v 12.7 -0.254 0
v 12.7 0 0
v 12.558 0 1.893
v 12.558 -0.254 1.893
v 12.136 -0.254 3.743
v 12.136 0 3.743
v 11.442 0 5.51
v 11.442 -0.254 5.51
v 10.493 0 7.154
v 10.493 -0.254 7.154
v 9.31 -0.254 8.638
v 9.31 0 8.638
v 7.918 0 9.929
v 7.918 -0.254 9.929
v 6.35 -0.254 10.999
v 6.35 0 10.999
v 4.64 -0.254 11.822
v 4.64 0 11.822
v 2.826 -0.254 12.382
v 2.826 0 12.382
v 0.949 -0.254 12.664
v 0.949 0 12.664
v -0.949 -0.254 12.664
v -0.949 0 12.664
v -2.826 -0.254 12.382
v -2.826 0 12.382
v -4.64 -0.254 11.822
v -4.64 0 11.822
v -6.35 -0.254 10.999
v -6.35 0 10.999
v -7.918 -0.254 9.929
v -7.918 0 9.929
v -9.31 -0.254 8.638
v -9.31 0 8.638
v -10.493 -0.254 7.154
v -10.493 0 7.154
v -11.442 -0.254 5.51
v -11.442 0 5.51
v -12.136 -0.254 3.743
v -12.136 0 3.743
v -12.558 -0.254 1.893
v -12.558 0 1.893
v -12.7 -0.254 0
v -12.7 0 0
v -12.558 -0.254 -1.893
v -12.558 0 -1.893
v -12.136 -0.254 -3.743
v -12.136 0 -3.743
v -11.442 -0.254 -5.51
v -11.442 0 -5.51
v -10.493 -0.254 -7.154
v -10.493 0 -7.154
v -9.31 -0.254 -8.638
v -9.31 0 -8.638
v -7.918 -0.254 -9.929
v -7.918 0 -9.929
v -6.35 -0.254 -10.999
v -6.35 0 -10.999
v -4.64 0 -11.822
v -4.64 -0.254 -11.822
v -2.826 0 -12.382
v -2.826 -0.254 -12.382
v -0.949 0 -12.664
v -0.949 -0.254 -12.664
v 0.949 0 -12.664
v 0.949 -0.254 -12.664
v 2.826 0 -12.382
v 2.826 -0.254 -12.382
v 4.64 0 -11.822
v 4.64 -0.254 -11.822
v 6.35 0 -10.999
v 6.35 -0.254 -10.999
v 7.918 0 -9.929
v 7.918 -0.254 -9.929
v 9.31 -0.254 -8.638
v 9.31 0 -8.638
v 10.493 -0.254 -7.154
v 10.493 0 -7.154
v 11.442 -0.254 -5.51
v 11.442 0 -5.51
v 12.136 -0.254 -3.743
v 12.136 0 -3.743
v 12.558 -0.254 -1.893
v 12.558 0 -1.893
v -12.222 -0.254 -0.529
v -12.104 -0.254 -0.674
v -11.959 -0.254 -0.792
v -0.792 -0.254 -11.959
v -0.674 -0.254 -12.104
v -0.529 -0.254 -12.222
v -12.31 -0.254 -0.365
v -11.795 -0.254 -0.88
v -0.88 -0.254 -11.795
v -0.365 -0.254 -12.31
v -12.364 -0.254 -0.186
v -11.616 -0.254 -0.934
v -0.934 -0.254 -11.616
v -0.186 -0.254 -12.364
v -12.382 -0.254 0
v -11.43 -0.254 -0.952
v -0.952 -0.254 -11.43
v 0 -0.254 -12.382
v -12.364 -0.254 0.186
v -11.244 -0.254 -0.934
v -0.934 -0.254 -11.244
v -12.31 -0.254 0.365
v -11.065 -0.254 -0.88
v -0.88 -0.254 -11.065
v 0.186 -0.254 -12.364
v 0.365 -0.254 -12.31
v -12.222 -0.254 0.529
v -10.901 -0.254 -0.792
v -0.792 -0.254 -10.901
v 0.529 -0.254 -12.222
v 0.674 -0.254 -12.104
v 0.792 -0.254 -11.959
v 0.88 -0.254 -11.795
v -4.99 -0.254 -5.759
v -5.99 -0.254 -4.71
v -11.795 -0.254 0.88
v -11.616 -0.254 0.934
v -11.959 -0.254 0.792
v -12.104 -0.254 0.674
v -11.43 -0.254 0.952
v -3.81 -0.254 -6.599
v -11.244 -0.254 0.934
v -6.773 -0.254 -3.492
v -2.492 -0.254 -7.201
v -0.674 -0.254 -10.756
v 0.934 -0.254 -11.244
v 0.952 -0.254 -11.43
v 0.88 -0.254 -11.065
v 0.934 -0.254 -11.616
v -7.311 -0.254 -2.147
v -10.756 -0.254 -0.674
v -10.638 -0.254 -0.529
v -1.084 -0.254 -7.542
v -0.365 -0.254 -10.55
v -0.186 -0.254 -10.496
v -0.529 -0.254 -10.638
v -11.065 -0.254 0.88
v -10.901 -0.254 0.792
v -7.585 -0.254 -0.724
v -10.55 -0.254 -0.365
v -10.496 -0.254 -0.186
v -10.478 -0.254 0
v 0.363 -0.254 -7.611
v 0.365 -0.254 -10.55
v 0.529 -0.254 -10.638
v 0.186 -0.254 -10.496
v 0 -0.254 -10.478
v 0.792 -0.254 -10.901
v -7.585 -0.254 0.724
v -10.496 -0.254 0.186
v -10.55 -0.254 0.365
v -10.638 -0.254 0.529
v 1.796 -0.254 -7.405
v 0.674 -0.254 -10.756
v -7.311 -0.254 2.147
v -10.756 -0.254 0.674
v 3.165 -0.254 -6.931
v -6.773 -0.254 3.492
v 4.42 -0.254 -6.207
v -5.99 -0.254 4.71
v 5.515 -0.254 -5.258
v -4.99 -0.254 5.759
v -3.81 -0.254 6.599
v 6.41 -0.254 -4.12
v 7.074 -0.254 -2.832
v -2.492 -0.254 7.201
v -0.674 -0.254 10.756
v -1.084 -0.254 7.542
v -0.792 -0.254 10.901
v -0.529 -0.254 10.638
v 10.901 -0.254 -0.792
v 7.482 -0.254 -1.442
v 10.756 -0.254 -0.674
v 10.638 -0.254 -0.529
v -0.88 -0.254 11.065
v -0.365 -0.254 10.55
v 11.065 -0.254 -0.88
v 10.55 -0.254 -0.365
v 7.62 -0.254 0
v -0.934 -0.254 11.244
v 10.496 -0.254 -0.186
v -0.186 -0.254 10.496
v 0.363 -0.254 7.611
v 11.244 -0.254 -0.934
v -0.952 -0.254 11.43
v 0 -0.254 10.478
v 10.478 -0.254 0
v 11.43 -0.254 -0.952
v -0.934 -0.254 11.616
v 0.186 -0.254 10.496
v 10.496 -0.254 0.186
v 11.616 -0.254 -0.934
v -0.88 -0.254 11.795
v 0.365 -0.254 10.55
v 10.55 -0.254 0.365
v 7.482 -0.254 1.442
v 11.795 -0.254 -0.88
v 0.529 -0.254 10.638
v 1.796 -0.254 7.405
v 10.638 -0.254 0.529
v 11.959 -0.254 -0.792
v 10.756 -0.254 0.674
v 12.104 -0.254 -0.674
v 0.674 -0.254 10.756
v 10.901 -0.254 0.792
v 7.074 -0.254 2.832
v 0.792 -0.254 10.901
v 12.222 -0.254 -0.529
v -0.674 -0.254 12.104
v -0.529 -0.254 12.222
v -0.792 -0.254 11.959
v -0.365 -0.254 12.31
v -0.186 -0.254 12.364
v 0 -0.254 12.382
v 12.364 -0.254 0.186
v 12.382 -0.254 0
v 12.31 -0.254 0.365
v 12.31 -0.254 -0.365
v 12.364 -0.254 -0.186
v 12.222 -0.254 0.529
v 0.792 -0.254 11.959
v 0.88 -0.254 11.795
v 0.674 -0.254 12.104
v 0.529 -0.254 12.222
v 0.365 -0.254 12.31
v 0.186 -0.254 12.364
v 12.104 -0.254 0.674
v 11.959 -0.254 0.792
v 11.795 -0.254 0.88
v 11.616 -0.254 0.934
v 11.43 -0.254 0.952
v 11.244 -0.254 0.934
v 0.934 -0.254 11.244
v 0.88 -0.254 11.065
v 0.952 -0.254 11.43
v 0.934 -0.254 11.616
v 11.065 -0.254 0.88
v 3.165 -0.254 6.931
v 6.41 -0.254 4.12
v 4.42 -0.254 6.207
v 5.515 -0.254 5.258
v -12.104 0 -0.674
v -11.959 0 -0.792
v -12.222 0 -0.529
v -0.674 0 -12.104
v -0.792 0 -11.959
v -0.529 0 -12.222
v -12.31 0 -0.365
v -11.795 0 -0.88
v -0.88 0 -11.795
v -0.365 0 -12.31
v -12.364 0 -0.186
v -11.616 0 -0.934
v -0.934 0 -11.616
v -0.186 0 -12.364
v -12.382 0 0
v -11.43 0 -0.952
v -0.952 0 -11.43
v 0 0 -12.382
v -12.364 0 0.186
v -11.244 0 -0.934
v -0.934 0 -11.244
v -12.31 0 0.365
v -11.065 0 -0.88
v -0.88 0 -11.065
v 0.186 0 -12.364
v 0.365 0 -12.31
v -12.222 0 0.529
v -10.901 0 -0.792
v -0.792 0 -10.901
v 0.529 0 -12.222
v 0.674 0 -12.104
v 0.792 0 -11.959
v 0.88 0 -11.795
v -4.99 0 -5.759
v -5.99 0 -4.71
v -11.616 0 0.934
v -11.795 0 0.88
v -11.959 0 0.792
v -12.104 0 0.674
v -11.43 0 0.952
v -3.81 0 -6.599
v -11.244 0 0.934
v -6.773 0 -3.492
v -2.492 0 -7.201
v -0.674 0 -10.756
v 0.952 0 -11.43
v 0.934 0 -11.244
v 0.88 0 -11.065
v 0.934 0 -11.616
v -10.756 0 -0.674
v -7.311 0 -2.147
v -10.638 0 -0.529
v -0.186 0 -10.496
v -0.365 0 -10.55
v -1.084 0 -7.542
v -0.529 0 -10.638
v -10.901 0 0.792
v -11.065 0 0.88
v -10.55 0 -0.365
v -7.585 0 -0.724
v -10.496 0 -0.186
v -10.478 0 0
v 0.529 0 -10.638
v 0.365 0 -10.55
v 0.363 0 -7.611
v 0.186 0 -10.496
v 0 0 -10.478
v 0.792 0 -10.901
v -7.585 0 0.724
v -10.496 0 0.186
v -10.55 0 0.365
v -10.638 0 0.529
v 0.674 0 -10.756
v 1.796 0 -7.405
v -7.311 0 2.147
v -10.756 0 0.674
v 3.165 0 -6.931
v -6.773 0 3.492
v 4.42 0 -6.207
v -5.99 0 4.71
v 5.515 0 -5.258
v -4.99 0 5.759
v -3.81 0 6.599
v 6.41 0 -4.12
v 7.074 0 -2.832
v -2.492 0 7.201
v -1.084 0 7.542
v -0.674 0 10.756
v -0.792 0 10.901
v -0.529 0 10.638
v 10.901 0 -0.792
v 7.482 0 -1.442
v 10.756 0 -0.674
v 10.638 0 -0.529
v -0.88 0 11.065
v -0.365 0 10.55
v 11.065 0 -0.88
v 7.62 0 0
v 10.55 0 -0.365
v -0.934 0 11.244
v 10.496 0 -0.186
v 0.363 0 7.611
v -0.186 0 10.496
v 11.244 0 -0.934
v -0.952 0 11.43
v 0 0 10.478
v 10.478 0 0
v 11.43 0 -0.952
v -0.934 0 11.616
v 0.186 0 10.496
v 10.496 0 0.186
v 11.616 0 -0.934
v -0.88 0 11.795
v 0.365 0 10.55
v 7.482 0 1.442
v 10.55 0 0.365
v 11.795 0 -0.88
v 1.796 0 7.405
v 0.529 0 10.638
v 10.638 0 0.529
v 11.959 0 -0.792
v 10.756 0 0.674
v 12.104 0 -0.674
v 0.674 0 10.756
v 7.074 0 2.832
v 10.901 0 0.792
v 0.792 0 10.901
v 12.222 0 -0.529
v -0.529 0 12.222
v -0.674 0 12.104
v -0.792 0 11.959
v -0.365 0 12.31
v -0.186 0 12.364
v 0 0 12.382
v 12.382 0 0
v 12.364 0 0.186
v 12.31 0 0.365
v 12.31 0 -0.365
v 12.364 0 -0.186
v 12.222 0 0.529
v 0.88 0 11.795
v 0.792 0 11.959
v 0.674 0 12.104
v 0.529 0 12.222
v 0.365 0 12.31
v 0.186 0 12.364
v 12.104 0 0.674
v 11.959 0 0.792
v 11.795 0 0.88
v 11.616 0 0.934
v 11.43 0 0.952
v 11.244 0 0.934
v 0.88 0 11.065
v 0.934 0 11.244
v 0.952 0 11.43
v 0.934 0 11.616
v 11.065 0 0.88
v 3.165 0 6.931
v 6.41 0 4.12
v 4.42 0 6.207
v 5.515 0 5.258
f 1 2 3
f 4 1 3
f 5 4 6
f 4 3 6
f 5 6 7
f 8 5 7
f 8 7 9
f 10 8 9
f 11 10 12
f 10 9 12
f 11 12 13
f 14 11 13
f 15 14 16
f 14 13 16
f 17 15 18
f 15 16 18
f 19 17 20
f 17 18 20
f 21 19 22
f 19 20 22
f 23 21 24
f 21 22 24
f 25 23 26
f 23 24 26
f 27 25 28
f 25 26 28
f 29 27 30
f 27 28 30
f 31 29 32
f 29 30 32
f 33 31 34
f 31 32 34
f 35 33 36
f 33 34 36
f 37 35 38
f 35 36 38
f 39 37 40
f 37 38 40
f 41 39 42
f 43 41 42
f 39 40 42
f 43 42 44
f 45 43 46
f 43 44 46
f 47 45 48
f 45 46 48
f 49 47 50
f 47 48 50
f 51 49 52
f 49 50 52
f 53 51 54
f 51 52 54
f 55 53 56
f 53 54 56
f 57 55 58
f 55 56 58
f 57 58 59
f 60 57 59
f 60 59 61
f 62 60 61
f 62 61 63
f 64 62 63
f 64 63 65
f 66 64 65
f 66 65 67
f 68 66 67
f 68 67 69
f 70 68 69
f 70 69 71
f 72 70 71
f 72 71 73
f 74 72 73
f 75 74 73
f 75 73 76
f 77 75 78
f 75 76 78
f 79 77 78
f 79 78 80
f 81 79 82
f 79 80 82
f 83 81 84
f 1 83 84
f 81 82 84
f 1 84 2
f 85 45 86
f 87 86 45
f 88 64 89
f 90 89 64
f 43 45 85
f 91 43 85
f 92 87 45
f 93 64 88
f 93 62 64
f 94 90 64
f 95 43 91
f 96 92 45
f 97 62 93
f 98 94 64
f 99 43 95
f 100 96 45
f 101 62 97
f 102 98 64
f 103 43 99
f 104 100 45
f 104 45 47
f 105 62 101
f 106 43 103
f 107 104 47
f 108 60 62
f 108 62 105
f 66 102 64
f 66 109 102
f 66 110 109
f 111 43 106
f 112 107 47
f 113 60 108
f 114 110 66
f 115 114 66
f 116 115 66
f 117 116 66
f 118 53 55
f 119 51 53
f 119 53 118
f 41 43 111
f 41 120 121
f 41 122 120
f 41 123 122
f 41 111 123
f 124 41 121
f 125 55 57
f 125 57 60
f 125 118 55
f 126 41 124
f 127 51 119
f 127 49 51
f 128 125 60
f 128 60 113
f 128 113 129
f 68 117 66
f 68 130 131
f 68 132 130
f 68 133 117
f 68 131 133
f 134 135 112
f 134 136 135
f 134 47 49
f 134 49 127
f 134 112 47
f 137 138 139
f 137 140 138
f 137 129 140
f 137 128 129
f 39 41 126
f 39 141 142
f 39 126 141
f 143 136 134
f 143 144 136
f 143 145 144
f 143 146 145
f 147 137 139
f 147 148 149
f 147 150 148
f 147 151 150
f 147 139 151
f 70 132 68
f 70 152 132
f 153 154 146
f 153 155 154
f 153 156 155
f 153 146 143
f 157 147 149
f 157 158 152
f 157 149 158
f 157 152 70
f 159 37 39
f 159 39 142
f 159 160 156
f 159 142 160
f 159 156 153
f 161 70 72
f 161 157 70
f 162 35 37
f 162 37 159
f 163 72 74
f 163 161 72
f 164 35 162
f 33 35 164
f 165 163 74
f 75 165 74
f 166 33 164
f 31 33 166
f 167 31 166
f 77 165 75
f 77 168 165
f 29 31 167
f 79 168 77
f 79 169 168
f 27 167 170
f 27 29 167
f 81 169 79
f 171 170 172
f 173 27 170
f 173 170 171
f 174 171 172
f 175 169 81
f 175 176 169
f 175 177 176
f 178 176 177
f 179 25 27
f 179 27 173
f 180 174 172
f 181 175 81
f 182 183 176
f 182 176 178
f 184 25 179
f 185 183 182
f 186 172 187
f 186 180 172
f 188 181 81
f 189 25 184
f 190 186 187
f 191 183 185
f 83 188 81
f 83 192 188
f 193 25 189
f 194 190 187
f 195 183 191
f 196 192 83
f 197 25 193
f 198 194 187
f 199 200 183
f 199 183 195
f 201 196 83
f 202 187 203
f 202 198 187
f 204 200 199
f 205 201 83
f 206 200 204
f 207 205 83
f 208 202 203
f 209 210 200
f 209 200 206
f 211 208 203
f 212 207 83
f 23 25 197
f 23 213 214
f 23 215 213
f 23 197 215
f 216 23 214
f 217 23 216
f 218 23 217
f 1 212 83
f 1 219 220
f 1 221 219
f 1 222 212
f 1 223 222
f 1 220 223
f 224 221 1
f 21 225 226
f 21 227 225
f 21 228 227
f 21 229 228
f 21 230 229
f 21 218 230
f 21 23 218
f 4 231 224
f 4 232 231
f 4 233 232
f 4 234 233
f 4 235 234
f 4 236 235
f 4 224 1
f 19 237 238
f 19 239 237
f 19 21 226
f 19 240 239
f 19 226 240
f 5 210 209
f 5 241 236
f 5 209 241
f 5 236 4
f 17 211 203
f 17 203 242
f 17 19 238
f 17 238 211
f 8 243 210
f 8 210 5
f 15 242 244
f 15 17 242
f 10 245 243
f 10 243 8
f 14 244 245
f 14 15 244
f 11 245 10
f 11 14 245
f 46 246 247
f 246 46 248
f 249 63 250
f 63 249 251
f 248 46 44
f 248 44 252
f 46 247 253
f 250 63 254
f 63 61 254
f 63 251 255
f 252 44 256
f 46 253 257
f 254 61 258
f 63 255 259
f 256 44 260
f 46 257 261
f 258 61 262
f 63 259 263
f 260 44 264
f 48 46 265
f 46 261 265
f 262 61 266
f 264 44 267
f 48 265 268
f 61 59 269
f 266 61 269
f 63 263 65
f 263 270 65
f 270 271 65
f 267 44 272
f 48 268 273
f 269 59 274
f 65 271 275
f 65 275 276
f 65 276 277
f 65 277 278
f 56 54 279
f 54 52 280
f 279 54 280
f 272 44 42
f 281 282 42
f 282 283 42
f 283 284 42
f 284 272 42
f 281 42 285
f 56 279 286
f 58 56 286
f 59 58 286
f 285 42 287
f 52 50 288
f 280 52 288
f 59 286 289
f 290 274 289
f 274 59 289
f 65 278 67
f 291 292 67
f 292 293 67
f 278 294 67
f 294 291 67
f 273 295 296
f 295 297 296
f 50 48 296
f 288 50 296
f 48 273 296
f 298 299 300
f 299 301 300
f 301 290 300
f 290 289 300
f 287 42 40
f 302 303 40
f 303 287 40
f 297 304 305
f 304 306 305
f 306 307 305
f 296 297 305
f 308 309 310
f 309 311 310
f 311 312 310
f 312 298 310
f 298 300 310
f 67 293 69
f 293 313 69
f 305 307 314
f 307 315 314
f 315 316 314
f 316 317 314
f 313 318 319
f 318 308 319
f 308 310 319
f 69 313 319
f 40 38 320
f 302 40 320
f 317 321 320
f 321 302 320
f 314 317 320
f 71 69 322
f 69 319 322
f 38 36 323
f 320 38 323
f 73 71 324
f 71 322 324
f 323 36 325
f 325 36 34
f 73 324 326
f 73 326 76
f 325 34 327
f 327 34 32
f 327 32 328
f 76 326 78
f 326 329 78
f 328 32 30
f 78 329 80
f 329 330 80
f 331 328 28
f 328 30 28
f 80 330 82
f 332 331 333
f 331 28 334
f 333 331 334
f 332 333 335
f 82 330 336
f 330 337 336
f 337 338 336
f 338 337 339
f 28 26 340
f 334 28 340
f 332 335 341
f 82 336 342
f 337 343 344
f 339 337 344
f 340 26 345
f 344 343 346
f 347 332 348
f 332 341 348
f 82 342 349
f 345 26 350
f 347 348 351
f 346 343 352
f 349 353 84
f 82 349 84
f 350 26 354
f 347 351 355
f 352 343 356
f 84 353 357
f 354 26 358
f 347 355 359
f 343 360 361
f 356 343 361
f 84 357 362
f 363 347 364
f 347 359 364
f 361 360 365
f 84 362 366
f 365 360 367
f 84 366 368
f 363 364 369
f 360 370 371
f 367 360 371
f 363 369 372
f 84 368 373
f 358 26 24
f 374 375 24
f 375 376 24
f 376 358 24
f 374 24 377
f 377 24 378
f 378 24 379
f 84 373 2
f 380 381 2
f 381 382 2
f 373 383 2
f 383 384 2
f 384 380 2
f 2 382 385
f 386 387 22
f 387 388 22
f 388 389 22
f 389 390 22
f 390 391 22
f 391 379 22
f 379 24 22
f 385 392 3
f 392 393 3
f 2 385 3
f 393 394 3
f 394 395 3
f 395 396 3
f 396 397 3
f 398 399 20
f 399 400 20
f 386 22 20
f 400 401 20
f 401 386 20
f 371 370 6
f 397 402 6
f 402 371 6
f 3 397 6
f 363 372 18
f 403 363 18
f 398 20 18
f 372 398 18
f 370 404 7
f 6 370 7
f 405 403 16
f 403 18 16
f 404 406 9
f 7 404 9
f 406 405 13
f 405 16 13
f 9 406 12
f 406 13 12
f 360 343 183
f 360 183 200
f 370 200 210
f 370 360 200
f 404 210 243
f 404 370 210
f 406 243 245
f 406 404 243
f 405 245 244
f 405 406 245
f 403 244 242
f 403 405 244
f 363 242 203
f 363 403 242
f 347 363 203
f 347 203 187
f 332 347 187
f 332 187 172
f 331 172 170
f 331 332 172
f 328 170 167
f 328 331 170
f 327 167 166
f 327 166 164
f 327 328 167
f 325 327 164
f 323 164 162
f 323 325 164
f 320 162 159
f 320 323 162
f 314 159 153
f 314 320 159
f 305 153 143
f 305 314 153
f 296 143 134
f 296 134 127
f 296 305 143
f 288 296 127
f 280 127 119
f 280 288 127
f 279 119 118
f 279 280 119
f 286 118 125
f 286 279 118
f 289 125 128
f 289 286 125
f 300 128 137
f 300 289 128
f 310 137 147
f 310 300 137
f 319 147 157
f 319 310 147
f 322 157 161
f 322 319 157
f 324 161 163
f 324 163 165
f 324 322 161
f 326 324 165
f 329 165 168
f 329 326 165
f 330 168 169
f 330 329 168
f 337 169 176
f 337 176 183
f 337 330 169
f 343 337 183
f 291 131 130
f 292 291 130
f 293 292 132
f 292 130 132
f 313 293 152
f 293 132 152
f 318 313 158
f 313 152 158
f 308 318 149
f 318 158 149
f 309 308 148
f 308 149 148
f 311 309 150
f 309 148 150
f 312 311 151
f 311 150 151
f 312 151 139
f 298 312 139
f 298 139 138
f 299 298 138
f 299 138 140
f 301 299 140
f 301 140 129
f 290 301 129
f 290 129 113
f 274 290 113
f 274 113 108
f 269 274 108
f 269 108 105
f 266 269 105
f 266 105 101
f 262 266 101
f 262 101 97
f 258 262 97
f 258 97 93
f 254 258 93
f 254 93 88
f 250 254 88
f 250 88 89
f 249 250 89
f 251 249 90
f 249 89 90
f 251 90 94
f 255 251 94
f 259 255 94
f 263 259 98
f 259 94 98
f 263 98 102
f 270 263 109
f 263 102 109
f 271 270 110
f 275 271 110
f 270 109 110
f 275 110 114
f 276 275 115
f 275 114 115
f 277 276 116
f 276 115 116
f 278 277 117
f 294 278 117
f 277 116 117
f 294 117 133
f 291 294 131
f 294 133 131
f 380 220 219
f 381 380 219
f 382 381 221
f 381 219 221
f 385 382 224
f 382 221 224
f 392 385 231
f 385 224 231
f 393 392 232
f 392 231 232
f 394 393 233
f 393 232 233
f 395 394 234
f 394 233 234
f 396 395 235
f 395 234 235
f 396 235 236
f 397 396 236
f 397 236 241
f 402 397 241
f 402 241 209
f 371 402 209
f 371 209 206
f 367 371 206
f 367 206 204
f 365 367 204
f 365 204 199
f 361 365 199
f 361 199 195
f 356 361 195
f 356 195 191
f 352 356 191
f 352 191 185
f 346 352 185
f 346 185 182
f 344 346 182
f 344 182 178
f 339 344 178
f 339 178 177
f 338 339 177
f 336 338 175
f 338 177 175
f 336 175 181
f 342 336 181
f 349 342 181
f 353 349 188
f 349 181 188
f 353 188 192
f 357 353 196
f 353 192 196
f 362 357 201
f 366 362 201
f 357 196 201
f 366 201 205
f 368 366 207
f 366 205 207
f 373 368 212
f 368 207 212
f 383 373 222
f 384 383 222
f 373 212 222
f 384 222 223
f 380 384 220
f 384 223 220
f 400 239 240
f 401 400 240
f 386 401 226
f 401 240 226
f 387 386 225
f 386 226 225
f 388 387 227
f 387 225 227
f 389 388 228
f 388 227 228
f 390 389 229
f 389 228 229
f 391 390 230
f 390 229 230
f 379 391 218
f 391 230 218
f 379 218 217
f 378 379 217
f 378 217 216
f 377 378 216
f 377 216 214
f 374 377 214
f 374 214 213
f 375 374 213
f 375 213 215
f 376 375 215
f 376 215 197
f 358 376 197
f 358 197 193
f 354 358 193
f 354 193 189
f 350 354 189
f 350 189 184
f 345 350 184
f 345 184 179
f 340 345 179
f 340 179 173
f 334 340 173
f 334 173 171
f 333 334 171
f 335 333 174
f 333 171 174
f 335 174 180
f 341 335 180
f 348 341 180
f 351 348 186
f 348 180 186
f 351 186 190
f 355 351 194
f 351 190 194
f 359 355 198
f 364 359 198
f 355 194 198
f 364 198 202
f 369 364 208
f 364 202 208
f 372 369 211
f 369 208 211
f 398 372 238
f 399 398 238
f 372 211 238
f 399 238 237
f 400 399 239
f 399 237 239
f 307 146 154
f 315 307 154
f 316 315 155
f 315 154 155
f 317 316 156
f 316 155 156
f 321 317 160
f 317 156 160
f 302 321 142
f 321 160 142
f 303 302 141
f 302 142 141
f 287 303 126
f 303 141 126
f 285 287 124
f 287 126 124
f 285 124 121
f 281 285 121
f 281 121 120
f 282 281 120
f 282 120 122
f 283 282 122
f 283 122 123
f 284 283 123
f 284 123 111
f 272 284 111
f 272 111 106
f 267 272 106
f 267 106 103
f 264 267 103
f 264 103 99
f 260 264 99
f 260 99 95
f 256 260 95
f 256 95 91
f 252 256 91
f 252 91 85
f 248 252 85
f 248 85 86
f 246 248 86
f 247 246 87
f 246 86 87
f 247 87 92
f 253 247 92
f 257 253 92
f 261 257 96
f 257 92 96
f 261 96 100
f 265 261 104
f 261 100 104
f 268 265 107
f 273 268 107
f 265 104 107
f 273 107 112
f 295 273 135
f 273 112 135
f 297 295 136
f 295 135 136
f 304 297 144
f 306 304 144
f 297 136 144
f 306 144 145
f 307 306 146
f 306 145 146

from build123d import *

# Parameters (mm, degrees)
F0_R     = 12.7
F0_R_2   = 7.62
F1_DEPTH = 0.254
F2_R     = 0.9525
F3_DEPTH = 25.4


with BuildPart() as f1:
    # F0 (on Front) → F1 (new body)
    with BuildSketch(Plane.XZ):
        Circle(F0_R)
        Circle(F0_R_2, mode=Mode.SUBTRACT)
    extrude(amount=F1_DEPTH)

    # F2 (on face) → F3 (cut)
    with BuildSketch(Plane.XZ.offset(0.254)):
        with Locations((0, 11.43)):
            Circle(F2_R)
        with Locations((11.43, 0)):
            Circle(F2_R)
        with Locations((0, -11.43)):
            Circle(F2_R)
        with Locations((-11.43, 0)):
            Circle(F2_R)
    extrude(amount=-F3_DEPTH, mode=Mode.SUBTRACT)


solid = f1.part
